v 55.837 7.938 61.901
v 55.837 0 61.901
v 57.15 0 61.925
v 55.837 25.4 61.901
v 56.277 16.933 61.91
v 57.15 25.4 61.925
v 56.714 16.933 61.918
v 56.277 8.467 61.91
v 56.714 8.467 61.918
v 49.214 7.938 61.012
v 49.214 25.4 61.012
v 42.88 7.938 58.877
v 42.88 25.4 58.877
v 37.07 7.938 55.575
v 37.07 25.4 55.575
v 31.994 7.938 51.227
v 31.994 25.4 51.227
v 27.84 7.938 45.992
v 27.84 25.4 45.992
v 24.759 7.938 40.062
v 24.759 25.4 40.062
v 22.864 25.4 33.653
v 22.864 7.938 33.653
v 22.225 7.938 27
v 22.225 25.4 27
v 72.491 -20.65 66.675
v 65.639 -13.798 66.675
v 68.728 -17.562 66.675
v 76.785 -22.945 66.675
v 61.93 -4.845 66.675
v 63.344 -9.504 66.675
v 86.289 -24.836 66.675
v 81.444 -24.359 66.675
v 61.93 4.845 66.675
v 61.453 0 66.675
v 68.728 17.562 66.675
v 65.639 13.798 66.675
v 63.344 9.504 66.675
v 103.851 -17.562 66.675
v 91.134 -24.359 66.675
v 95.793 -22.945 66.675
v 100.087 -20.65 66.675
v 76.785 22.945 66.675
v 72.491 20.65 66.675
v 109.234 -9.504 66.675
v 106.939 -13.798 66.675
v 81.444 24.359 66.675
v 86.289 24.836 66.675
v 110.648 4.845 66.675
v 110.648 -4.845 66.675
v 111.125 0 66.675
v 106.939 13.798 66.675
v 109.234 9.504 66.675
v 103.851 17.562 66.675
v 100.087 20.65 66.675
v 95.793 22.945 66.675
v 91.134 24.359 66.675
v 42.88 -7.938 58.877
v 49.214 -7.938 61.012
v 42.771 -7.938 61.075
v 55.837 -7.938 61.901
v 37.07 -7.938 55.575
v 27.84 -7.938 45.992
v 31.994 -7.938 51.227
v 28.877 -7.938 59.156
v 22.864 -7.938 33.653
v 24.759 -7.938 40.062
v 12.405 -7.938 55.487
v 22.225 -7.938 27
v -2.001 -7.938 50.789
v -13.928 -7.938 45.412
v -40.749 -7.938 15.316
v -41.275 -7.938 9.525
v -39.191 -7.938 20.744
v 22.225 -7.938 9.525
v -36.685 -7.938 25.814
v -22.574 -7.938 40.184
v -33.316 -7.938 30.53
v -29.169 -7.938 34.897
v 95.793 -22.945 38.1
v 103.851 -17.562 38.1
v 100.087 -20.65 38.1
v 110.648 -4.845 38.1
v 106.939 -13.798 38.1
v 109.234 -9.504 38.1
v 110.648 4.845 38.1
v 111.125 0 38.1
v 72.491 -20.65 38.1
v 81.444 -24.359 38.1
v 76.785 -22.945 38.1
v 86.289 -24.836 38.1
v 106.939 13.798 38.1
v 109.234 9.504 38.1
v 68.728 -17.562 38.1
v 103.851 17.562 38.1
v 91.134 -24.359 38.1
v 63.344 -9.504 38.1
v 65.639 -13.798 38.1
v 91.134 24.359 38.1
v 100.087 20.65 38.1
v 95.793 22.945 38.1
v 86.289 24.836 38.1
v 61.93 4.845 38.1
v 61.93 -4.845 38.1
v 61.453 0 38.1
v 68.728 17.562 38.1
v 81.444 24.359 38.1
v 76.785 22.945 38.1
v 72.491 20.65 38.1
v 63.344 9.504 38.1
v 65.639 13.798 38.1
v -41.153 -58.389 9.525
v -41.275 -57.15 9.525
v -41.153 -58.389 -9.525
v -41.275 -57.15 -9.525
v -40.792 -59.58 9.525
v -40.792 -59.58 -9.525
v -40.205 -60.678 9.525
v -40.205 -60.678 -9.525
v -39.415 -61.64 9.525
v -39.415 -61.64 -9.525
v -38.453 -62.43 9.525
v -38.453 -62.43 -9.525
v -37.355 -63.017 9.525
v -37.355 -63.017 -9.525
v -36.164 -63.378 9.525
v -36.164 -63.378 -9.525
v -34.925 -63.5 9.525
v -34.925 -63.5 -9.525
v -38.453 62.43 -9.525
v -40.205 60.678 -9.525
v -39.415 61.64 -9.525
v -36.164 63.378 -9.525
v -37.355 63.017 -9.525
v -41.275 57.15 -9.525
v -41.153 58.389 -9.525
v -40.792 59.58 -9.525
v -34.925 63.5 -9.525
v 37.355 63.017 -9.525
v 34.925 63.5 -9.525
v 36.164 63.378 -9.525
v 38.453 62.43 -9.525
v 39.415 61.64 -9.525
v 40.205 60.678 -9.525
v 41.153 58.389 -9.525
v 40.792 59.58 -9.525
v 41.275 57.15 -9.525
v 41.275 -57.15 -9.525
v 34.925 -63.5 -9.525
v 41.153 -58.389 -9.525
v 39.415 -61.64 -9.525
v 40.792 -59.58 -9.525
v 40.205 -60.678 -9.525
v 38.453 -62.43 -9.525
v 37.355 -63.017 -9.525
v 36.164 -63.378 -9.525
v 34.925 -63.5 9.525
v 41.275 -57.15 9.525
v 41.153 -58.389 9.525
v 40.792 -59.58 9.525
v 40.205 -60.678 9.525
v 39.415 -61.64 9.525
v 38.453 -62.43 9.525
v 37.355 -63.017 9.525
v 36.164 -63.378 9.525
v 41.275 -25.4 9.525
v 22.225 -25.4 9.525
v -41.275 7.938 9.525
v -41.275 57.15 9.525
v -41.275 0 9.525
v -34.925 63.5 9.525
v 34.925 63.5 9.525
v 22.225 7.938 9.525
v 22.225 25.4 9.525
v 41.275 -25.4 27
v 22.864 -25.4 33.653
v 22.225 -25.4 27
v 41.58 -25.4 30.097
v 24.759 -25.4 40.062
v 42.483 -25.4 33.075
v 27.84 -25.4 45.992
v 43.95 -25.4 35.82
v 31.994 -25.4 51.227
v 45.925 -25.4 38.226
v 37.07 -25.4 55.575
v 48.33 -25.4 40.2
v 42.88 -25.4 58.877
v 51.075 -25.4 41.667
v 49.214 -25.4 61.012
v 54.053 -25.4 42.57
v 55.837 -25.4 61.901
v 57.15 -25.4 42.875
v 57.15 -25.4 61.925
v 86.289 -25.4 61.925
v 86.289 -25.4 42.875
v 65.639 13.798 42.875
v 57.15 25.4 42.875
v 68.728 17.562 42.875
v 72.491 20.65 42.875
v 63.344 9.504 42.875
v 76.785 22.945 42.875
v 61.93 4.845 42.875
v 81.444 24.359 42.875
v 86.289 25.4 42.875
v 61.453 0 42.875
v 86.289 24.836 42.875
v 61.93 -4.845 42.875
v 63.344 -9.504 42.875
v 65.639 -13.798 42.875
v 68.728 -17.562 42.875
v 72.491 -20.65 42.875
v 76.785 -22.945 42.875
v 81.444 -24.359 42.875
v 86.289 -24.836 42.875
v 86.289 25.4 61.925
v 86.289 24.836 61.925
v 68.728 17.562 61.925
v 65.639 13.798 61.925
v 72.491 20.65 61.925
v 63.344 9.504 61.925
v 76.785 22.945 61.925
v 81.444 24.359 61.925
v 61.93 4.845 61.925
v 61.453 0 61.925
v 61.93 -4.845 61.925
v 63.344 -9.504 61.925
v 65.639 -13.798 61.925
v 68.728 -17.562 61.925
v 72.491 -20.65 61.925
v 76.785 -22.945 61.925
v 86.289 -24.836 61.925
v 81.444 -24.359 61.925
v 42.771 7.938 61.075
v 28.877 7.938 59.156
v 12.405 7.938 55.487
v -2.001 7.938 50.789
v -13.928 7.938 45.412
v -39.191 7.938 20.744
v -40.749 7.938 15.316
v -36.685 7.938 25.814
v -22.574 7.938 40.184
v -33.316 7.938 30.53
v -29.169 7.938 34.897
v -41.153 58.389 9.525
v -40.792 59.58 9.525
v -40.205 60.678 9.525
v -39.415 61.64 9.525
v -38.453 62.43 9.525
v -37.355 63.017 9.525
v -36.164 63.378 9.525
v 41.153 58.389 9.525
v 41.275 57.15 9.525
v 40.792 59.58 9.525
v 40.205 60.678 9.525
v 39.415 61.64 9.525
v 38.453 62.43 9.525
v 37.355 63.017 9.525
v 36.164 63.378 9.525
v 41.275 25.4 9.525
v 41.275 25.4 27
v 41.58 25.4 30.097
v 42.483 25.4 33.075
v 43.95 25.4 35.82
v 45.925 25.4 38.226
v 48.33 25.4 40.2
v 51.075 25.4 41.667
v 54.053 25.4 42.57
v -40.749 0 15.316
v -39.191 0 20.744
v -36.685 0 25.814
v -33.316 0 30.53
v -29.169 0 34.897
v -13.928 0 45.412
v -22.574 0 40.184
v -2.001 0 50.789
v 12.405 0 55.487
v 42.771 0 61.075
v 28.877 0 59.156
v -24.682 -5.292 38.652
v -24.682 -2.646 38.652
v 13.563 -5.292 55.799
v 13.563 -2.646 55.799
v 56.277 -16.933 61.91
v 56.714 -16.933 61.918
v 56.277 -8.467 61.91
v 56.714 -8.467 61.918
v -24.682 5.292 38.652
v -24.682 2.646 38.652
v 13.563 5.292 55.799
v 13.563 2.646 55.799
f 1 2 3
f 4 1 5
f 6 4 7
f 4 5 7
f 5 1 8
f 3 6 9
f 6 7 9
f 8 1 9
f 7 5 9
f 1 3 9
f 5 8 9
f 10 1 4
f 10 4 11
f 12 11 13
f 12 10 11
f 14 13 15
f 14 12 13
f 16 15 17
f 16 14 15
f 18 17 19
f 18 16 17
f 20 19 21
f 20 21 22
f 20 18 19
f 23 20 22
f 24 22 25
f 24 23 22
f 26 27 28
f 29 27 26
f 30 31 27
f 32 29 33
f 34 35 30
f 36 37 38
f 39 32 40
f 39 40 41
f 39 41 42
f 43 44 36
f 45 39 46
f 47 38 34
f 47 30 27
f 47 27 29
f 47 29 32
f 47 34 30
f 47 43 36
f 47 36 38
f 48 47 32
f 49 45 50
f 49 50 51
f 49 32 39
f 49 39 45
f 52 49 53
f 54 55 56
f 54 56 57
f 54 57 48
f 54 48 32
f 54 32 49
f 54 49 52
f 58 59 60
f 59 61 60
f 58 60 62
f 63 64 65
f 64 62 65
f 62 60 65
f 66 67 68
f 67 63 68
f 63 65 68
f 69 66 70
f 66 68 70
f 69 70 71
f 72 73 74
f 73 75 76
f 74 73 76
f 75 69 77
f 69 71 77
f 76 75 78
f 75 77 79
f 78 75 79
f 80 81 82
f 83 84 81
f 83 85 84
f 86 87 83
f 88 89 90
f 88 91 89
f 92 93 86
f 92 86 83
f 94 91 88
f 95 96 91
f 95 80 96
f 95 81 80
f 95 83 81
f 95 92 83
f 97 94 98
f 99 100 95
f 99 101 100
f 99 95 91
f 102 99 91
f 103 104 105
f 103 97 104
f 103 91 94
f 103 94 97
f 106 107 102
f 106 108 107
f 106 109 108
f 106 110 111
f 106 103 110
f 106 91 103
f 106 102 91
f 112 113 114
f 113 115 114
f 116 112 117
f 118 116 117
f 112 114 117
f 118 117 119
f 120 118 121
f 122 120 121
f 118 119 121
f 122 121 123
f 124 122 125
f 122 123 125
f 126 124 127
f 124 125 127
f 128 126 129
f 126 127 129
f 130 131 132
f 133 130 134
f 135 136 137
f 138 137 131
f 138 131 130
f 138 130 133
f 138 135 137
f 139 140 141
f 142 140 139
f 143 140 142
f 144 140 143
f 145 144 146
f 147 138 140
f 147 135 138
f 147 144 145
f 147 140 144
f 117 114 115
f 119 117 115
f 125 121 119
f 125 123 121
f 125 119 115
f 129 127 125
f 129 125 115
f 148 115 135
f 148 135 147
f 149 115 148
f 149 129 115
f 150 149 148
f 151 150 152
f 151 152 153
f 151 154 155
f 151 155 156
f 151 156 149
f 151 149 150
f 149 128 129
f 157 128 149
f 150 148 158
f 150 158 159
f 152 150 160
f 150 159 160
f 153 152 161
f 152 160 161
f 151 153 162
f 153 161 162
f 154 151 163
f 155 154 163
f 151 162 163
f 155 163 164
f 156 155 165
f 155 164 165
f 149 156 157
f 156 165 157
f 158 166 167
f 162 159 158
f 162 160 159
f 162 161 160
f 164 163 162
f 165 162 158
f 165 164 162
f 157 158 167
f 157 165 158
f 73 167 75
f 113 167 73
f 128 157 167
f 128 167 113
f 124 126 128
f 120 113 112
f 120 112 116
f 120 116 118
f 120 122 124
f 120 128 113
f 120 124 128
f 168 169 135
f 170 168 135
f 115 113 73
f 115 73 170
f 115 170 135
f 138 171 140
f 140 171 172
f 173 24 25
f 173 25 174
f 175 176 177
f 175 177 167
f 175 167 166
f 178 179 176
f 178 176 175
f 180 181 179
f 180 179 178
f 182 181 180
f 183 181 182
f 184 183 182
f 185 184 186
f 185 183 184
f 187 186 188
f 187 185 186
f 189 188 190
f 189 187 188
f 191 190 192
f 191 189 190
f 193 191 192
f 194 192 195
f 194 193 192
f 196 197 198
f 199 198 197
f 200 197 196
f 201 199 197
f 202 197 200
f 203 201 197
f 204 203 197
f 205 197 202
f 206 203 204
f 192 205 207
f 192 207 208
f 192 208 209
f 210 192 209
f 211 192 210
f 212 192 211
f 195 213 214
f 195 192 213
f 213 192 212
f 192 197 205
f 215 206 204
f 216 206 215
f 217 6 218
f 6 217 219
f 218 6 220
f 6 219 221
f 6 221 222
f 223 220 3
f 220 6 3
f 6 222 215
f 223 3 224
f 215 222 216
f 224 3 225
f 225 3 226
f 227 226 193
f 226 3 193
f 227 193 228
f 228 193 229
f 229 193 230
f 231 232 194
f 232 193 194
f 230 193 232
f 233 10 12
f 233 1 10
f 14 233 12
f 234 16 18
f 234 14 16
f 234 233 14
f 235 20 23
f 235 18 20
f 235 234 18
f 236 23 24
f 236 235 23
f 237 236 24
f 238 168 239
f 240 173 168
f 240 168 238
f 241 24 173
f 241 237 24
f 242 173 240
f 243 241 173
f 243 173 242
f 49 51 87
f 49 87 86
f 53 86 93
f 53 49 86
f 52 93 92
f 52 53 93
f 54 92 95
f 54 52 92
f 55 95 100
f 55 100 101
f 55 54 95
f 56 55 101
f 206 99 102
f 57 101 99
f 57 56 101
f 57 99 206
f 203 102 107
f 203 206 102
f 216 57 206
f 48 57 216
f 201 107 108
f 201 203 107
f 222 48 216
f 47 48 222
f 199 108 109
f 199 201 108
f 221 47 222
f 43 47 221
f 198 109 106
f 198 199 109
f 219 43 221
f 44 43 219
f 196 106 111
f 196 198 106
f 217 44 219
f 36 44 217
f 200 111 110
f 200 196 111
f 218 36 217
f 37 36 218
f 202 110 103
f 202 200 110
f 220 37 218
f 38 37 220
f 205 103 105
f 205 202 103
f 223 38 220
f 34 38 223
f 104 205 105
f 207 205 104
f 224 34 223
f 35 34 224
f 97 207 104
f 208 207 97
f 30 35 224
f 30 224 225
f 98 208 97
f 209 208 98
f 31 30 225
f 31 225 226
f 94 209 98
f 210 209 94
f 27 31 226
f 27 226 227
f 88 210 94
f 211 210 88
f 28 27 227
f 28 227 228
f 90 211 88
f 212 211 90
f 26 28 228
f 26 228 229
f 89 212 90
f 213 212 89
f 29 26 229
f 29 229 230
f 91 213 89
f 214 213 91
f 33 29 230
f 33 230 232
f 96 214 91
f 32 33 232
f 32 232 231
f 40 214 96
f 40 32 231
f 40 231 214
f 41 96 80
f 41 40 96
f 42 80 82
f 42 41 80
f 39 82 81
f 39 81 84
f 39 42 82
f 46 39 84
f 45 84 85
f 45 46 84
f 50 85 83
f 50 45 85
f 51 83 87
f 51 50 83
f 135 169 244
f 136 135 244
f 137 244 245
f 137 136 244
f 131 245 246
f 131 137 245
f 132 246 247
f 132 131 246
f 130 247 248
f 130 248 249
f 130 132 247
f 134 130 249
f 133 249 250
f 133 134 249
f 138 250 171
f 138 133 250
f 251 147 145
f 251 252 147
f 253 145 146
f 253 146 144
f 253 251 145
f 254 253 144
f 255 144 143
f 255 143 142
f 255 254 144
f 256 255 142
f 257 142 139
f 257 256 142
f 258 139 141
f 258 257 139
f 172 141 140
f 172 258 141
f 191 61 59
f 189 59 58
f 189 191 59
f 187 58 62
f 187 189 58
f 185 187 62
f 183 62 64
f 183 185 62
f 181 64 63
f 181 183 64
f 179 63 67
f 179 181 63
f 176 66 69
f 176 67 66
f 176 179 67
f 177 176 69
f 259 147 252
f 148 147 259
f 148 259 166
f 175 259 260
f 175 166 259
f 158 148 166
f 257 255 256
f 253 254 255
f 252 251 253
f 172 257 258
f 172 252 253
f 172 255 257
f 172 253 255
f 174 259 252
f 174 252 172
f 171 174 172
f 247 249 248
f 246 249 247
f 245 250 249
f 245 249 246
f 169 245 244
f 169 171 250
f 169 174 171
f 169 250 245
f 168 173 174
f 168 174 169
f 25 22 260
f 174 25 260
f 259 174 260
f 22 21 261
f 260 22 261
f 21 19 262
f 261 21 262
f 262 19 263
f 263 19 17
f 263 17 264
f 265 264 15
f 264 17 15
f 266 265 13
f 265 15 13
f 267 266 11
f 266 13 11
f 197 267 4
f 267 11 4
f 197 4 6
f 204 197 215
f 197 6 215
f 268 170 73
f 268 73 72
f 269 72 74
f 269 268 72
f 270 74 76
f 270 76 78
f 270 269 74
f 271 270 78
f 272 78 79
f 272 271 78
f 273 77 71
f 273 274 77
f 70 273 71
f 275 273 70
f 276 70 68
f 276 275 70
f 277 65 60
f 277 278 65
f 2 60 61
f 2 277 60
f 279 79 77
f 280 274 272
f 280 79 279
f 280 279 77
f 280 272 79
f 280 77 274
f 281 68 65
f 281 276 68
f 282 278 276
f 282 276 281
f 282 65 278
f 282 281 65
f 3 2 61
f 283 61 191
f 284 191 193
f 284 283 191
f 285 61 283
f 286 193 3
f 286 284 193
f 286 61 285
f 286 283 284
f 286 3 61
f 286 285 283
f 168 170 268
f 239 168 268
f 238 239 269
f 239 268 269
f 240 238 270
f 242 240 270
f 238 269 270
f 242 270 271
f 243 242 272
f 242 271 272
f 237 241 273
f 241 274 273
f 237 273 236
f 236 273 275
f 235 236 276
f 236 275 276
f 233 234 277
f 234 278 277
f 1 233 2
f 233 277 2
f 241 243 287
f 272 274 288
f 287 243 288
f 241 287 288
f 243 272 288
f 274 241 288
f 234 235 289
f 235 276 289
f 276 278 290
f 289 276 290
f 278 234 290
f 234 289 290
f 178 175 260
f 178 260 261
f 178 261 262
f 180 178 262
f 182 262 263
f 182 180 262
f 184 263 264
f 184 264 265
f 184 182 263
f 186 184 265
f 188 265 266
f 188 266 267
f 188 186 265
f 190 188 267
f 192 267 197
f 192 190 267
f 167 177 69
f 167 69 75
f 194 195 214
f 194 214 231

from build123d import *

# Parameters (mm, degrees)
F1_DEPTH = 63.5
F2_DEPTH = 25.4
F3_DEPTH = 7.9375
F0_W     = 25.9641238877
F0_H     = 19.05
F4_DEPTH = 25.4
F6_R     = 6.35


with BuildPart() as f1:
    # F0 (on Front) → F1 (new body, symmetric)
    with BuildSketch(Plane.XZ):
        Polygon((22.225, 9.525), (-41.275, 9.525), (-41.275, -9.525), (41.275, -9.525), (41.275, 9.525), align=None)
    extrude(amount=F1_DEPTH, both=True)

    # F0 (on Front) → F2 (join, symmetric)
    with BuildSketch(Plane.XZ):
        with BuildLine():
            Line((22.225, 27.0002), (22.225, 9.525))
            Line((22.225, 9.525), (41.275, 9.525))
            Line((41.275, 9.525), (41.275, 27.0002))
            ThreePointArc((41.275, 27.0002), (45.9246798487, 38.2255201513), (57.15, 42.8752))
            Line((57.15, 42.8752), (60.325, 42.8752))
            Line((60.325, 42.8752), (60.325, 61.9252))
            Line((60.325, 61.9252), (57.15, 61.9252))
            add(Edge.make_bspline(
                [(55.8373775892, 61.9005244599), (56.2776364161, 61.9107392271), (56.7152170121, 61.9189622944), (57.15, 61.9252)],
                knots=[110.241102344, 110.241102344, 110.241102344, 110.241102344, 111.5045361635, 111.5045361635, 111.5045361635, 111.5045361635], degree=3))
            ThreePointArc((55.8373775892, 61.9005244599), (31.9944940152, 51.2273777896), (22.225, 27.0002))
        make_face()
    extrude(amount=F2_DEPTH, both=True)

    # F0 (on Front) → F3 (join, symmetric)
    with BuildSketch(Plane.XZ):
        with BuildLine():
            add(Edge.make_bspline(
                [(-41.275, 9.525), (-41.3829236444, 44.9542144396), (17.4225293824, 61.0092334589), (55.8373775892, 61.9005244599)],
                knots=[0, 0, 0, 0, 110.241102344, 110.241102344, 110.241102344, 110.241102344], degree=3))
            Line((-41.275, 9.525), (22.225, 9.525))
            Line((22.225, 9.525), (22.225, 27.0002))
            ThreePointArc((22.225, 27.0002), (31.9944940152, 51.2273777896), (55.8373775892, 61.9005244599))
        make_face()
    extrude(amount=F3_DEPTH, both=True)

    # F0 (on Front) → F4 (join, symmetric)
    with BuildSketch(Plane.XZ):
        with Locations((73.3070619439, 52.4002)):
            Rectangle(F0_W, F0_H)
    extrude(amount=F4_DEPTH, both=True)

    # F0 (on Front) → F5 (revolve)
    with BuildSketch(Plane.XZ):
        Polygon((86.2891238877, 66.675), (86.2891238877, 61.9252), (86.2891238877, 42.8752), (86.2891238877, 38.1), (111.125, 38.1), (111.125, 66.675), align=None)
    revolve(axis=Axis((86.2891238877, 0, 50.0126), (0, 0, 1)))

    # F6
    f6_edges = [f1.edges().sort_by_distance(p)[0] for p in [
        (41.275, 63.5, 0),
        (-41.275, 63.5, 0),
        (-41.275, -63.5, 0),
        (41.275, -63.5, 0),
    ]]
    fillet(f6_edges, radius=F6_R)


solid = f1.part
